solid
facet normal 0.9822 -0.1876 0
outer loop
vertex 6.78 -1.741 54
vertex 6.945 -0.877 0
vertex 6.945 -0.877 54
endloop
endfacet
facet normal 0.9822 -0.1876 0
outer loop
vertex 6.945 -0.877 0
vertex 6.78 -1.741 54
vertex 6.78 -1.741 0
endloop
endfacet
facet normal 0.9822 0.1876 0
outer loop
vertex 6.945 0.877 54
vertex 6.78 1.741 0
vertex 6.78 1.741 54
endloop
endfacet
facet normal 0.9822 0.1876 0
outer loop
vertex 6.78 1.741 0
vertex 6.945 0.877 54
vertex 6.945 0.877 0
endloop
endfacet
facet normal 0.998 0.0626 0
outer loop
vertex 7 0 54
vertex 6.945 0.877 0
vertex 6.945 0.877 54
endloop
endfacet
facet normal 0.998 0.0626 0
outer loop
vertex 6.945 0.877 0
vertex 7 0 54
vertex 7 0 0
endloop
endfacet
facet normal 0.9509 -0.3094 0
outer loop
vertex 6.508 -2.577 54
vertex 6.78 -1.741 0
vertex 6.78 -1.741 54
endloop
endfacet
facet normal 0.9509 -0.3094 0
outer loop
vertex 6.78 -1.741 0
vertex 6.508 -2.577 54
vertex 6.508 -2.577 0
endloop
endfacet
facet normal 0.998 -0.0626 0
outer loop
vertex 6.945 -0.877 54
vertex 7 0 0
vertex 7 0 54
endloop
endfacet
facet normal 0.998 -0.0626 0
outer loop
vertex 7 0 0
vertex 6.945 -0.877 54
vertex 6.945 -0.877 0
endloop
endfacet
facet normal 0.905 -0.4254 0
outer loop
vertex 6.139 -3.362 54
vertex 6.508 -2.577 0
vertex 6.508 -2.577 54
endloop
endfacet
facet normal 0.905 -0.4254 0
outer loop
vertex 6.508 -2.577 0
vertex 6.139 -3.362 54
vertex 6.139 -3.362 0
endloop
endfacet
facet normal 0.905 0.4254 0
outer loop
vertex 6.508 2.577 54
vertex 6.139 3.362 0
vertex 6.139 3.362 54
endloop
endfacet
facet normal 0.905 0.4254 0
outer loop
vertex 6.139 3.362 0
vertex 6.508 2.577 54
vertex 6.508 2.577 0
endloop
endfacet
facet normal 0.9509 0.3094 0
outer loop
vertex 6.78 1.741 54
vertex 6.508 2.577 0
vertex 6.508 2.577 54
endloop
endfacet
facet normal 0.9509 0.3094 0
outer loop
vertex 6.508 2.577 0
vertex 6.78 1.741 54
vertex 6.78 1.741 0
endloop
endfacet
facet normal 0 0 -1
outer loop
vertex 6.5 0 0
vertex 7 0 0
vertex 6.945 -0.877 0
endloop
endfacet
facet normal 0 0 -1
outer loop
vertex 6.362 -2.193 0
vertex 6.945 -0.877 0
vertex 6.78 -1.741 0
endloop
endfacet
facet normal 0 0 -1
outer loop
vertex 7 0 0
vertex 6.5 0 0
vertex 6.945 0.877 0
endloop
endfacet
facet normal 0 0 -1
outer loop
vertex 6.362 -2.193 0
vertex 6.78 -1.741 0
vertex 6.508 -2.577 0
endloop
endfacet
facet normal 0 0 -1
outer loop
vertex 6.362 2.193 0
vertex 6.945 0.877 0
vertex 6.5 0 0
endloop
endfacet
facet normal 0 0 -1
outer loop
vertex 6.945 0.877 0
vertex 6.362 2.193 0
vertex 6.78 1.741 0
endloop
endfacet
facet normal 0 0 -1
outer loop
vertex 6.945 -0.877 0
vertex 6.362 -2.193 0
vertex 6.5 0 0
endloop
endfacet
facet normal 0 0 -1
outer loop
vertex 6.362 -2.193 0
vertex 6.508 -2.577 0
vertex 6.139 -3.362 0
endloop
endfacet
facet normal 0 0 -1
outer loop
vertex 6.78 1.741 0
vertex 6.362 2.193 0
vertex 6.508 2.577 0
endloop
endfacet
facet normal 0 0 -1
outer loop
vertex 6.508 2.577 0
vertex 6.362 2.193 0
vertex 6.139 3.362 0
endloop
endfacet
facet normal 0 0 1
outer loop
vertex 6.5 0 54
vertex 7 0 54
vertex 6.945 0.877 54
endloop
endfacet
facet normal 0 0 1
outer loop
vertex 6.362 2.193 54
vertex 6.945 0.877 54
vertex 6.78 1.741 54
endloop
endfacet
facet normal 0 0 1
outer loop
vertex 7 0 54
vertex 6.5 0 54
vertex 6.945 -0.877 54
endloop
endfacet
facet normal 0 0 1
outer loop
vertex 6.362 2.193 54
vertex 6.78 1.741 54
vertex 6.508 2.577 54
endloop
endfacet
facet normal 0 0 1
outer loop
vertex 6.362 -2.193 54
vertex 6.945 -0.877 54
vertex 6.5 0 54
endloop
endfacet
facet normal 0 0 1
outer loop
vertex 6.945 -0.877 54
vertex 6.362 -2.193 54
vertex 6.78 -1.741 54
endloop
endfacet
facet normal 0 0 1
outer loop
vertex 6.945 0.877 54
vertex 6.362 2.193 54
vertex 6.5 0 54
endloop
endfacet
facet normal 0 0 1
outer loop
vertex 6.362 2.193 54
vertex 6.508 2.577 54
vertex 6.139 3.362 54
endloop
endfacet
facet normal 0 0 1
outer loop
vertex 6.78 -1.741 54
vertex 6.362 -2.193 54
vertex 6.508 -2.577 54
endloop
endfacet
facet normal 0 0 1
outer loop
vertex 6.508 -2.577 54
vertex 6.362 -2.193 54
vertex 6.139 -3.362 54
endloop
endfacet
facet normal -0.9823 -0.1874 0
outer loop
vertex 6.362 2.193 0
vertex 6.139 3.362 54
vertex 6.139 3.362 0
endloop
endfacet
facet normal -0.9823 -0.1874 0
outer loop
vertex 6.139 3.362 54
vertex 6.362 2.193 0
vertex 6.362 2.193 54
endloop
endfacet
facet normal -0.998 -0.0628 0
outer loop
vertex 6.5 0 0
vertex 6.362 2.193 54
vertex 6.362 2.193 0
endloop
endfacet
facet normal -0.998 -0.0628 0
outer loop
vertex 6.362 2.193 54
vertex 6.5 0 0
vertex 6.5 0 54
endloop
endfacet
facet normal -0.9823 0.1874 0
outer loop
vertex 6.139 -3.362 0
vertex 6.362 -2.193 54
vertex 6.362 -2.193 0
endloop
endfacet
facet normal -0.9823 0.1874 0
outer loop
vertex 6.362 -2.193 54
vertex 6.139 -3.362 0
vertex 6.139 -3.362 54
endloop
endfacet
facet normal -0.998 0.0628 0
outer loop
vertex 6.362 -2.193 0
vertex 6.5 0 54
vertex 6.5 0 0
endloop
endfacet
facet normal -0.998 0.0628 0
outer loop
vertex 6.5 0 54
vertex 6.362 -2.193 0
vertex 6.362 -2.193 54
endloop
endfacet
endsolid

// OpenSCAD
$fn = 50;


difference() {
	union() {
		cylinder(h = 54, r = 7.0000000000);
		translate(v = [-14.0000000000, 0, 0]) {
			cylinder(h = 54, r = 7.0000000000);
		}
	}
	union() {
		cylinder(h = 54, r = 3.2500000000);
		cylinder(h = 54, r = 1.8000000000);
		cylinder(h = 54, r = 1.8000000000);
		cylinder(h = 54, r = 1.8000000000);
		translate(v = [-18.5000000000, 0, 0]) {
			hull() {
				translate(v = [-3.7500000000, 0.0000000000, 0]) {
					cylinder(h = 54, r = 7.5000000000);
				}
				translate(v = [3.7500000000, 0.0000000000, 0]) {
					cylinder(h = 54, r = 7.5000000000);
				}
				translate(v = [-3.7500000000, -0.0000000000, 0]) {
					cylinder(h = 54, r = 7.5000000000);
				}
				translate(v = [3.7500000000, -0.0000000000, 0]) {
					cylinder(h = 54, r = 7.5000000000);
				}
			}
		}
		translate(v = [-11.0000000000, 0, 0.0000000000]) {
			cylinder(h = 54, r = 17.5000000000);
		}
	}
}
